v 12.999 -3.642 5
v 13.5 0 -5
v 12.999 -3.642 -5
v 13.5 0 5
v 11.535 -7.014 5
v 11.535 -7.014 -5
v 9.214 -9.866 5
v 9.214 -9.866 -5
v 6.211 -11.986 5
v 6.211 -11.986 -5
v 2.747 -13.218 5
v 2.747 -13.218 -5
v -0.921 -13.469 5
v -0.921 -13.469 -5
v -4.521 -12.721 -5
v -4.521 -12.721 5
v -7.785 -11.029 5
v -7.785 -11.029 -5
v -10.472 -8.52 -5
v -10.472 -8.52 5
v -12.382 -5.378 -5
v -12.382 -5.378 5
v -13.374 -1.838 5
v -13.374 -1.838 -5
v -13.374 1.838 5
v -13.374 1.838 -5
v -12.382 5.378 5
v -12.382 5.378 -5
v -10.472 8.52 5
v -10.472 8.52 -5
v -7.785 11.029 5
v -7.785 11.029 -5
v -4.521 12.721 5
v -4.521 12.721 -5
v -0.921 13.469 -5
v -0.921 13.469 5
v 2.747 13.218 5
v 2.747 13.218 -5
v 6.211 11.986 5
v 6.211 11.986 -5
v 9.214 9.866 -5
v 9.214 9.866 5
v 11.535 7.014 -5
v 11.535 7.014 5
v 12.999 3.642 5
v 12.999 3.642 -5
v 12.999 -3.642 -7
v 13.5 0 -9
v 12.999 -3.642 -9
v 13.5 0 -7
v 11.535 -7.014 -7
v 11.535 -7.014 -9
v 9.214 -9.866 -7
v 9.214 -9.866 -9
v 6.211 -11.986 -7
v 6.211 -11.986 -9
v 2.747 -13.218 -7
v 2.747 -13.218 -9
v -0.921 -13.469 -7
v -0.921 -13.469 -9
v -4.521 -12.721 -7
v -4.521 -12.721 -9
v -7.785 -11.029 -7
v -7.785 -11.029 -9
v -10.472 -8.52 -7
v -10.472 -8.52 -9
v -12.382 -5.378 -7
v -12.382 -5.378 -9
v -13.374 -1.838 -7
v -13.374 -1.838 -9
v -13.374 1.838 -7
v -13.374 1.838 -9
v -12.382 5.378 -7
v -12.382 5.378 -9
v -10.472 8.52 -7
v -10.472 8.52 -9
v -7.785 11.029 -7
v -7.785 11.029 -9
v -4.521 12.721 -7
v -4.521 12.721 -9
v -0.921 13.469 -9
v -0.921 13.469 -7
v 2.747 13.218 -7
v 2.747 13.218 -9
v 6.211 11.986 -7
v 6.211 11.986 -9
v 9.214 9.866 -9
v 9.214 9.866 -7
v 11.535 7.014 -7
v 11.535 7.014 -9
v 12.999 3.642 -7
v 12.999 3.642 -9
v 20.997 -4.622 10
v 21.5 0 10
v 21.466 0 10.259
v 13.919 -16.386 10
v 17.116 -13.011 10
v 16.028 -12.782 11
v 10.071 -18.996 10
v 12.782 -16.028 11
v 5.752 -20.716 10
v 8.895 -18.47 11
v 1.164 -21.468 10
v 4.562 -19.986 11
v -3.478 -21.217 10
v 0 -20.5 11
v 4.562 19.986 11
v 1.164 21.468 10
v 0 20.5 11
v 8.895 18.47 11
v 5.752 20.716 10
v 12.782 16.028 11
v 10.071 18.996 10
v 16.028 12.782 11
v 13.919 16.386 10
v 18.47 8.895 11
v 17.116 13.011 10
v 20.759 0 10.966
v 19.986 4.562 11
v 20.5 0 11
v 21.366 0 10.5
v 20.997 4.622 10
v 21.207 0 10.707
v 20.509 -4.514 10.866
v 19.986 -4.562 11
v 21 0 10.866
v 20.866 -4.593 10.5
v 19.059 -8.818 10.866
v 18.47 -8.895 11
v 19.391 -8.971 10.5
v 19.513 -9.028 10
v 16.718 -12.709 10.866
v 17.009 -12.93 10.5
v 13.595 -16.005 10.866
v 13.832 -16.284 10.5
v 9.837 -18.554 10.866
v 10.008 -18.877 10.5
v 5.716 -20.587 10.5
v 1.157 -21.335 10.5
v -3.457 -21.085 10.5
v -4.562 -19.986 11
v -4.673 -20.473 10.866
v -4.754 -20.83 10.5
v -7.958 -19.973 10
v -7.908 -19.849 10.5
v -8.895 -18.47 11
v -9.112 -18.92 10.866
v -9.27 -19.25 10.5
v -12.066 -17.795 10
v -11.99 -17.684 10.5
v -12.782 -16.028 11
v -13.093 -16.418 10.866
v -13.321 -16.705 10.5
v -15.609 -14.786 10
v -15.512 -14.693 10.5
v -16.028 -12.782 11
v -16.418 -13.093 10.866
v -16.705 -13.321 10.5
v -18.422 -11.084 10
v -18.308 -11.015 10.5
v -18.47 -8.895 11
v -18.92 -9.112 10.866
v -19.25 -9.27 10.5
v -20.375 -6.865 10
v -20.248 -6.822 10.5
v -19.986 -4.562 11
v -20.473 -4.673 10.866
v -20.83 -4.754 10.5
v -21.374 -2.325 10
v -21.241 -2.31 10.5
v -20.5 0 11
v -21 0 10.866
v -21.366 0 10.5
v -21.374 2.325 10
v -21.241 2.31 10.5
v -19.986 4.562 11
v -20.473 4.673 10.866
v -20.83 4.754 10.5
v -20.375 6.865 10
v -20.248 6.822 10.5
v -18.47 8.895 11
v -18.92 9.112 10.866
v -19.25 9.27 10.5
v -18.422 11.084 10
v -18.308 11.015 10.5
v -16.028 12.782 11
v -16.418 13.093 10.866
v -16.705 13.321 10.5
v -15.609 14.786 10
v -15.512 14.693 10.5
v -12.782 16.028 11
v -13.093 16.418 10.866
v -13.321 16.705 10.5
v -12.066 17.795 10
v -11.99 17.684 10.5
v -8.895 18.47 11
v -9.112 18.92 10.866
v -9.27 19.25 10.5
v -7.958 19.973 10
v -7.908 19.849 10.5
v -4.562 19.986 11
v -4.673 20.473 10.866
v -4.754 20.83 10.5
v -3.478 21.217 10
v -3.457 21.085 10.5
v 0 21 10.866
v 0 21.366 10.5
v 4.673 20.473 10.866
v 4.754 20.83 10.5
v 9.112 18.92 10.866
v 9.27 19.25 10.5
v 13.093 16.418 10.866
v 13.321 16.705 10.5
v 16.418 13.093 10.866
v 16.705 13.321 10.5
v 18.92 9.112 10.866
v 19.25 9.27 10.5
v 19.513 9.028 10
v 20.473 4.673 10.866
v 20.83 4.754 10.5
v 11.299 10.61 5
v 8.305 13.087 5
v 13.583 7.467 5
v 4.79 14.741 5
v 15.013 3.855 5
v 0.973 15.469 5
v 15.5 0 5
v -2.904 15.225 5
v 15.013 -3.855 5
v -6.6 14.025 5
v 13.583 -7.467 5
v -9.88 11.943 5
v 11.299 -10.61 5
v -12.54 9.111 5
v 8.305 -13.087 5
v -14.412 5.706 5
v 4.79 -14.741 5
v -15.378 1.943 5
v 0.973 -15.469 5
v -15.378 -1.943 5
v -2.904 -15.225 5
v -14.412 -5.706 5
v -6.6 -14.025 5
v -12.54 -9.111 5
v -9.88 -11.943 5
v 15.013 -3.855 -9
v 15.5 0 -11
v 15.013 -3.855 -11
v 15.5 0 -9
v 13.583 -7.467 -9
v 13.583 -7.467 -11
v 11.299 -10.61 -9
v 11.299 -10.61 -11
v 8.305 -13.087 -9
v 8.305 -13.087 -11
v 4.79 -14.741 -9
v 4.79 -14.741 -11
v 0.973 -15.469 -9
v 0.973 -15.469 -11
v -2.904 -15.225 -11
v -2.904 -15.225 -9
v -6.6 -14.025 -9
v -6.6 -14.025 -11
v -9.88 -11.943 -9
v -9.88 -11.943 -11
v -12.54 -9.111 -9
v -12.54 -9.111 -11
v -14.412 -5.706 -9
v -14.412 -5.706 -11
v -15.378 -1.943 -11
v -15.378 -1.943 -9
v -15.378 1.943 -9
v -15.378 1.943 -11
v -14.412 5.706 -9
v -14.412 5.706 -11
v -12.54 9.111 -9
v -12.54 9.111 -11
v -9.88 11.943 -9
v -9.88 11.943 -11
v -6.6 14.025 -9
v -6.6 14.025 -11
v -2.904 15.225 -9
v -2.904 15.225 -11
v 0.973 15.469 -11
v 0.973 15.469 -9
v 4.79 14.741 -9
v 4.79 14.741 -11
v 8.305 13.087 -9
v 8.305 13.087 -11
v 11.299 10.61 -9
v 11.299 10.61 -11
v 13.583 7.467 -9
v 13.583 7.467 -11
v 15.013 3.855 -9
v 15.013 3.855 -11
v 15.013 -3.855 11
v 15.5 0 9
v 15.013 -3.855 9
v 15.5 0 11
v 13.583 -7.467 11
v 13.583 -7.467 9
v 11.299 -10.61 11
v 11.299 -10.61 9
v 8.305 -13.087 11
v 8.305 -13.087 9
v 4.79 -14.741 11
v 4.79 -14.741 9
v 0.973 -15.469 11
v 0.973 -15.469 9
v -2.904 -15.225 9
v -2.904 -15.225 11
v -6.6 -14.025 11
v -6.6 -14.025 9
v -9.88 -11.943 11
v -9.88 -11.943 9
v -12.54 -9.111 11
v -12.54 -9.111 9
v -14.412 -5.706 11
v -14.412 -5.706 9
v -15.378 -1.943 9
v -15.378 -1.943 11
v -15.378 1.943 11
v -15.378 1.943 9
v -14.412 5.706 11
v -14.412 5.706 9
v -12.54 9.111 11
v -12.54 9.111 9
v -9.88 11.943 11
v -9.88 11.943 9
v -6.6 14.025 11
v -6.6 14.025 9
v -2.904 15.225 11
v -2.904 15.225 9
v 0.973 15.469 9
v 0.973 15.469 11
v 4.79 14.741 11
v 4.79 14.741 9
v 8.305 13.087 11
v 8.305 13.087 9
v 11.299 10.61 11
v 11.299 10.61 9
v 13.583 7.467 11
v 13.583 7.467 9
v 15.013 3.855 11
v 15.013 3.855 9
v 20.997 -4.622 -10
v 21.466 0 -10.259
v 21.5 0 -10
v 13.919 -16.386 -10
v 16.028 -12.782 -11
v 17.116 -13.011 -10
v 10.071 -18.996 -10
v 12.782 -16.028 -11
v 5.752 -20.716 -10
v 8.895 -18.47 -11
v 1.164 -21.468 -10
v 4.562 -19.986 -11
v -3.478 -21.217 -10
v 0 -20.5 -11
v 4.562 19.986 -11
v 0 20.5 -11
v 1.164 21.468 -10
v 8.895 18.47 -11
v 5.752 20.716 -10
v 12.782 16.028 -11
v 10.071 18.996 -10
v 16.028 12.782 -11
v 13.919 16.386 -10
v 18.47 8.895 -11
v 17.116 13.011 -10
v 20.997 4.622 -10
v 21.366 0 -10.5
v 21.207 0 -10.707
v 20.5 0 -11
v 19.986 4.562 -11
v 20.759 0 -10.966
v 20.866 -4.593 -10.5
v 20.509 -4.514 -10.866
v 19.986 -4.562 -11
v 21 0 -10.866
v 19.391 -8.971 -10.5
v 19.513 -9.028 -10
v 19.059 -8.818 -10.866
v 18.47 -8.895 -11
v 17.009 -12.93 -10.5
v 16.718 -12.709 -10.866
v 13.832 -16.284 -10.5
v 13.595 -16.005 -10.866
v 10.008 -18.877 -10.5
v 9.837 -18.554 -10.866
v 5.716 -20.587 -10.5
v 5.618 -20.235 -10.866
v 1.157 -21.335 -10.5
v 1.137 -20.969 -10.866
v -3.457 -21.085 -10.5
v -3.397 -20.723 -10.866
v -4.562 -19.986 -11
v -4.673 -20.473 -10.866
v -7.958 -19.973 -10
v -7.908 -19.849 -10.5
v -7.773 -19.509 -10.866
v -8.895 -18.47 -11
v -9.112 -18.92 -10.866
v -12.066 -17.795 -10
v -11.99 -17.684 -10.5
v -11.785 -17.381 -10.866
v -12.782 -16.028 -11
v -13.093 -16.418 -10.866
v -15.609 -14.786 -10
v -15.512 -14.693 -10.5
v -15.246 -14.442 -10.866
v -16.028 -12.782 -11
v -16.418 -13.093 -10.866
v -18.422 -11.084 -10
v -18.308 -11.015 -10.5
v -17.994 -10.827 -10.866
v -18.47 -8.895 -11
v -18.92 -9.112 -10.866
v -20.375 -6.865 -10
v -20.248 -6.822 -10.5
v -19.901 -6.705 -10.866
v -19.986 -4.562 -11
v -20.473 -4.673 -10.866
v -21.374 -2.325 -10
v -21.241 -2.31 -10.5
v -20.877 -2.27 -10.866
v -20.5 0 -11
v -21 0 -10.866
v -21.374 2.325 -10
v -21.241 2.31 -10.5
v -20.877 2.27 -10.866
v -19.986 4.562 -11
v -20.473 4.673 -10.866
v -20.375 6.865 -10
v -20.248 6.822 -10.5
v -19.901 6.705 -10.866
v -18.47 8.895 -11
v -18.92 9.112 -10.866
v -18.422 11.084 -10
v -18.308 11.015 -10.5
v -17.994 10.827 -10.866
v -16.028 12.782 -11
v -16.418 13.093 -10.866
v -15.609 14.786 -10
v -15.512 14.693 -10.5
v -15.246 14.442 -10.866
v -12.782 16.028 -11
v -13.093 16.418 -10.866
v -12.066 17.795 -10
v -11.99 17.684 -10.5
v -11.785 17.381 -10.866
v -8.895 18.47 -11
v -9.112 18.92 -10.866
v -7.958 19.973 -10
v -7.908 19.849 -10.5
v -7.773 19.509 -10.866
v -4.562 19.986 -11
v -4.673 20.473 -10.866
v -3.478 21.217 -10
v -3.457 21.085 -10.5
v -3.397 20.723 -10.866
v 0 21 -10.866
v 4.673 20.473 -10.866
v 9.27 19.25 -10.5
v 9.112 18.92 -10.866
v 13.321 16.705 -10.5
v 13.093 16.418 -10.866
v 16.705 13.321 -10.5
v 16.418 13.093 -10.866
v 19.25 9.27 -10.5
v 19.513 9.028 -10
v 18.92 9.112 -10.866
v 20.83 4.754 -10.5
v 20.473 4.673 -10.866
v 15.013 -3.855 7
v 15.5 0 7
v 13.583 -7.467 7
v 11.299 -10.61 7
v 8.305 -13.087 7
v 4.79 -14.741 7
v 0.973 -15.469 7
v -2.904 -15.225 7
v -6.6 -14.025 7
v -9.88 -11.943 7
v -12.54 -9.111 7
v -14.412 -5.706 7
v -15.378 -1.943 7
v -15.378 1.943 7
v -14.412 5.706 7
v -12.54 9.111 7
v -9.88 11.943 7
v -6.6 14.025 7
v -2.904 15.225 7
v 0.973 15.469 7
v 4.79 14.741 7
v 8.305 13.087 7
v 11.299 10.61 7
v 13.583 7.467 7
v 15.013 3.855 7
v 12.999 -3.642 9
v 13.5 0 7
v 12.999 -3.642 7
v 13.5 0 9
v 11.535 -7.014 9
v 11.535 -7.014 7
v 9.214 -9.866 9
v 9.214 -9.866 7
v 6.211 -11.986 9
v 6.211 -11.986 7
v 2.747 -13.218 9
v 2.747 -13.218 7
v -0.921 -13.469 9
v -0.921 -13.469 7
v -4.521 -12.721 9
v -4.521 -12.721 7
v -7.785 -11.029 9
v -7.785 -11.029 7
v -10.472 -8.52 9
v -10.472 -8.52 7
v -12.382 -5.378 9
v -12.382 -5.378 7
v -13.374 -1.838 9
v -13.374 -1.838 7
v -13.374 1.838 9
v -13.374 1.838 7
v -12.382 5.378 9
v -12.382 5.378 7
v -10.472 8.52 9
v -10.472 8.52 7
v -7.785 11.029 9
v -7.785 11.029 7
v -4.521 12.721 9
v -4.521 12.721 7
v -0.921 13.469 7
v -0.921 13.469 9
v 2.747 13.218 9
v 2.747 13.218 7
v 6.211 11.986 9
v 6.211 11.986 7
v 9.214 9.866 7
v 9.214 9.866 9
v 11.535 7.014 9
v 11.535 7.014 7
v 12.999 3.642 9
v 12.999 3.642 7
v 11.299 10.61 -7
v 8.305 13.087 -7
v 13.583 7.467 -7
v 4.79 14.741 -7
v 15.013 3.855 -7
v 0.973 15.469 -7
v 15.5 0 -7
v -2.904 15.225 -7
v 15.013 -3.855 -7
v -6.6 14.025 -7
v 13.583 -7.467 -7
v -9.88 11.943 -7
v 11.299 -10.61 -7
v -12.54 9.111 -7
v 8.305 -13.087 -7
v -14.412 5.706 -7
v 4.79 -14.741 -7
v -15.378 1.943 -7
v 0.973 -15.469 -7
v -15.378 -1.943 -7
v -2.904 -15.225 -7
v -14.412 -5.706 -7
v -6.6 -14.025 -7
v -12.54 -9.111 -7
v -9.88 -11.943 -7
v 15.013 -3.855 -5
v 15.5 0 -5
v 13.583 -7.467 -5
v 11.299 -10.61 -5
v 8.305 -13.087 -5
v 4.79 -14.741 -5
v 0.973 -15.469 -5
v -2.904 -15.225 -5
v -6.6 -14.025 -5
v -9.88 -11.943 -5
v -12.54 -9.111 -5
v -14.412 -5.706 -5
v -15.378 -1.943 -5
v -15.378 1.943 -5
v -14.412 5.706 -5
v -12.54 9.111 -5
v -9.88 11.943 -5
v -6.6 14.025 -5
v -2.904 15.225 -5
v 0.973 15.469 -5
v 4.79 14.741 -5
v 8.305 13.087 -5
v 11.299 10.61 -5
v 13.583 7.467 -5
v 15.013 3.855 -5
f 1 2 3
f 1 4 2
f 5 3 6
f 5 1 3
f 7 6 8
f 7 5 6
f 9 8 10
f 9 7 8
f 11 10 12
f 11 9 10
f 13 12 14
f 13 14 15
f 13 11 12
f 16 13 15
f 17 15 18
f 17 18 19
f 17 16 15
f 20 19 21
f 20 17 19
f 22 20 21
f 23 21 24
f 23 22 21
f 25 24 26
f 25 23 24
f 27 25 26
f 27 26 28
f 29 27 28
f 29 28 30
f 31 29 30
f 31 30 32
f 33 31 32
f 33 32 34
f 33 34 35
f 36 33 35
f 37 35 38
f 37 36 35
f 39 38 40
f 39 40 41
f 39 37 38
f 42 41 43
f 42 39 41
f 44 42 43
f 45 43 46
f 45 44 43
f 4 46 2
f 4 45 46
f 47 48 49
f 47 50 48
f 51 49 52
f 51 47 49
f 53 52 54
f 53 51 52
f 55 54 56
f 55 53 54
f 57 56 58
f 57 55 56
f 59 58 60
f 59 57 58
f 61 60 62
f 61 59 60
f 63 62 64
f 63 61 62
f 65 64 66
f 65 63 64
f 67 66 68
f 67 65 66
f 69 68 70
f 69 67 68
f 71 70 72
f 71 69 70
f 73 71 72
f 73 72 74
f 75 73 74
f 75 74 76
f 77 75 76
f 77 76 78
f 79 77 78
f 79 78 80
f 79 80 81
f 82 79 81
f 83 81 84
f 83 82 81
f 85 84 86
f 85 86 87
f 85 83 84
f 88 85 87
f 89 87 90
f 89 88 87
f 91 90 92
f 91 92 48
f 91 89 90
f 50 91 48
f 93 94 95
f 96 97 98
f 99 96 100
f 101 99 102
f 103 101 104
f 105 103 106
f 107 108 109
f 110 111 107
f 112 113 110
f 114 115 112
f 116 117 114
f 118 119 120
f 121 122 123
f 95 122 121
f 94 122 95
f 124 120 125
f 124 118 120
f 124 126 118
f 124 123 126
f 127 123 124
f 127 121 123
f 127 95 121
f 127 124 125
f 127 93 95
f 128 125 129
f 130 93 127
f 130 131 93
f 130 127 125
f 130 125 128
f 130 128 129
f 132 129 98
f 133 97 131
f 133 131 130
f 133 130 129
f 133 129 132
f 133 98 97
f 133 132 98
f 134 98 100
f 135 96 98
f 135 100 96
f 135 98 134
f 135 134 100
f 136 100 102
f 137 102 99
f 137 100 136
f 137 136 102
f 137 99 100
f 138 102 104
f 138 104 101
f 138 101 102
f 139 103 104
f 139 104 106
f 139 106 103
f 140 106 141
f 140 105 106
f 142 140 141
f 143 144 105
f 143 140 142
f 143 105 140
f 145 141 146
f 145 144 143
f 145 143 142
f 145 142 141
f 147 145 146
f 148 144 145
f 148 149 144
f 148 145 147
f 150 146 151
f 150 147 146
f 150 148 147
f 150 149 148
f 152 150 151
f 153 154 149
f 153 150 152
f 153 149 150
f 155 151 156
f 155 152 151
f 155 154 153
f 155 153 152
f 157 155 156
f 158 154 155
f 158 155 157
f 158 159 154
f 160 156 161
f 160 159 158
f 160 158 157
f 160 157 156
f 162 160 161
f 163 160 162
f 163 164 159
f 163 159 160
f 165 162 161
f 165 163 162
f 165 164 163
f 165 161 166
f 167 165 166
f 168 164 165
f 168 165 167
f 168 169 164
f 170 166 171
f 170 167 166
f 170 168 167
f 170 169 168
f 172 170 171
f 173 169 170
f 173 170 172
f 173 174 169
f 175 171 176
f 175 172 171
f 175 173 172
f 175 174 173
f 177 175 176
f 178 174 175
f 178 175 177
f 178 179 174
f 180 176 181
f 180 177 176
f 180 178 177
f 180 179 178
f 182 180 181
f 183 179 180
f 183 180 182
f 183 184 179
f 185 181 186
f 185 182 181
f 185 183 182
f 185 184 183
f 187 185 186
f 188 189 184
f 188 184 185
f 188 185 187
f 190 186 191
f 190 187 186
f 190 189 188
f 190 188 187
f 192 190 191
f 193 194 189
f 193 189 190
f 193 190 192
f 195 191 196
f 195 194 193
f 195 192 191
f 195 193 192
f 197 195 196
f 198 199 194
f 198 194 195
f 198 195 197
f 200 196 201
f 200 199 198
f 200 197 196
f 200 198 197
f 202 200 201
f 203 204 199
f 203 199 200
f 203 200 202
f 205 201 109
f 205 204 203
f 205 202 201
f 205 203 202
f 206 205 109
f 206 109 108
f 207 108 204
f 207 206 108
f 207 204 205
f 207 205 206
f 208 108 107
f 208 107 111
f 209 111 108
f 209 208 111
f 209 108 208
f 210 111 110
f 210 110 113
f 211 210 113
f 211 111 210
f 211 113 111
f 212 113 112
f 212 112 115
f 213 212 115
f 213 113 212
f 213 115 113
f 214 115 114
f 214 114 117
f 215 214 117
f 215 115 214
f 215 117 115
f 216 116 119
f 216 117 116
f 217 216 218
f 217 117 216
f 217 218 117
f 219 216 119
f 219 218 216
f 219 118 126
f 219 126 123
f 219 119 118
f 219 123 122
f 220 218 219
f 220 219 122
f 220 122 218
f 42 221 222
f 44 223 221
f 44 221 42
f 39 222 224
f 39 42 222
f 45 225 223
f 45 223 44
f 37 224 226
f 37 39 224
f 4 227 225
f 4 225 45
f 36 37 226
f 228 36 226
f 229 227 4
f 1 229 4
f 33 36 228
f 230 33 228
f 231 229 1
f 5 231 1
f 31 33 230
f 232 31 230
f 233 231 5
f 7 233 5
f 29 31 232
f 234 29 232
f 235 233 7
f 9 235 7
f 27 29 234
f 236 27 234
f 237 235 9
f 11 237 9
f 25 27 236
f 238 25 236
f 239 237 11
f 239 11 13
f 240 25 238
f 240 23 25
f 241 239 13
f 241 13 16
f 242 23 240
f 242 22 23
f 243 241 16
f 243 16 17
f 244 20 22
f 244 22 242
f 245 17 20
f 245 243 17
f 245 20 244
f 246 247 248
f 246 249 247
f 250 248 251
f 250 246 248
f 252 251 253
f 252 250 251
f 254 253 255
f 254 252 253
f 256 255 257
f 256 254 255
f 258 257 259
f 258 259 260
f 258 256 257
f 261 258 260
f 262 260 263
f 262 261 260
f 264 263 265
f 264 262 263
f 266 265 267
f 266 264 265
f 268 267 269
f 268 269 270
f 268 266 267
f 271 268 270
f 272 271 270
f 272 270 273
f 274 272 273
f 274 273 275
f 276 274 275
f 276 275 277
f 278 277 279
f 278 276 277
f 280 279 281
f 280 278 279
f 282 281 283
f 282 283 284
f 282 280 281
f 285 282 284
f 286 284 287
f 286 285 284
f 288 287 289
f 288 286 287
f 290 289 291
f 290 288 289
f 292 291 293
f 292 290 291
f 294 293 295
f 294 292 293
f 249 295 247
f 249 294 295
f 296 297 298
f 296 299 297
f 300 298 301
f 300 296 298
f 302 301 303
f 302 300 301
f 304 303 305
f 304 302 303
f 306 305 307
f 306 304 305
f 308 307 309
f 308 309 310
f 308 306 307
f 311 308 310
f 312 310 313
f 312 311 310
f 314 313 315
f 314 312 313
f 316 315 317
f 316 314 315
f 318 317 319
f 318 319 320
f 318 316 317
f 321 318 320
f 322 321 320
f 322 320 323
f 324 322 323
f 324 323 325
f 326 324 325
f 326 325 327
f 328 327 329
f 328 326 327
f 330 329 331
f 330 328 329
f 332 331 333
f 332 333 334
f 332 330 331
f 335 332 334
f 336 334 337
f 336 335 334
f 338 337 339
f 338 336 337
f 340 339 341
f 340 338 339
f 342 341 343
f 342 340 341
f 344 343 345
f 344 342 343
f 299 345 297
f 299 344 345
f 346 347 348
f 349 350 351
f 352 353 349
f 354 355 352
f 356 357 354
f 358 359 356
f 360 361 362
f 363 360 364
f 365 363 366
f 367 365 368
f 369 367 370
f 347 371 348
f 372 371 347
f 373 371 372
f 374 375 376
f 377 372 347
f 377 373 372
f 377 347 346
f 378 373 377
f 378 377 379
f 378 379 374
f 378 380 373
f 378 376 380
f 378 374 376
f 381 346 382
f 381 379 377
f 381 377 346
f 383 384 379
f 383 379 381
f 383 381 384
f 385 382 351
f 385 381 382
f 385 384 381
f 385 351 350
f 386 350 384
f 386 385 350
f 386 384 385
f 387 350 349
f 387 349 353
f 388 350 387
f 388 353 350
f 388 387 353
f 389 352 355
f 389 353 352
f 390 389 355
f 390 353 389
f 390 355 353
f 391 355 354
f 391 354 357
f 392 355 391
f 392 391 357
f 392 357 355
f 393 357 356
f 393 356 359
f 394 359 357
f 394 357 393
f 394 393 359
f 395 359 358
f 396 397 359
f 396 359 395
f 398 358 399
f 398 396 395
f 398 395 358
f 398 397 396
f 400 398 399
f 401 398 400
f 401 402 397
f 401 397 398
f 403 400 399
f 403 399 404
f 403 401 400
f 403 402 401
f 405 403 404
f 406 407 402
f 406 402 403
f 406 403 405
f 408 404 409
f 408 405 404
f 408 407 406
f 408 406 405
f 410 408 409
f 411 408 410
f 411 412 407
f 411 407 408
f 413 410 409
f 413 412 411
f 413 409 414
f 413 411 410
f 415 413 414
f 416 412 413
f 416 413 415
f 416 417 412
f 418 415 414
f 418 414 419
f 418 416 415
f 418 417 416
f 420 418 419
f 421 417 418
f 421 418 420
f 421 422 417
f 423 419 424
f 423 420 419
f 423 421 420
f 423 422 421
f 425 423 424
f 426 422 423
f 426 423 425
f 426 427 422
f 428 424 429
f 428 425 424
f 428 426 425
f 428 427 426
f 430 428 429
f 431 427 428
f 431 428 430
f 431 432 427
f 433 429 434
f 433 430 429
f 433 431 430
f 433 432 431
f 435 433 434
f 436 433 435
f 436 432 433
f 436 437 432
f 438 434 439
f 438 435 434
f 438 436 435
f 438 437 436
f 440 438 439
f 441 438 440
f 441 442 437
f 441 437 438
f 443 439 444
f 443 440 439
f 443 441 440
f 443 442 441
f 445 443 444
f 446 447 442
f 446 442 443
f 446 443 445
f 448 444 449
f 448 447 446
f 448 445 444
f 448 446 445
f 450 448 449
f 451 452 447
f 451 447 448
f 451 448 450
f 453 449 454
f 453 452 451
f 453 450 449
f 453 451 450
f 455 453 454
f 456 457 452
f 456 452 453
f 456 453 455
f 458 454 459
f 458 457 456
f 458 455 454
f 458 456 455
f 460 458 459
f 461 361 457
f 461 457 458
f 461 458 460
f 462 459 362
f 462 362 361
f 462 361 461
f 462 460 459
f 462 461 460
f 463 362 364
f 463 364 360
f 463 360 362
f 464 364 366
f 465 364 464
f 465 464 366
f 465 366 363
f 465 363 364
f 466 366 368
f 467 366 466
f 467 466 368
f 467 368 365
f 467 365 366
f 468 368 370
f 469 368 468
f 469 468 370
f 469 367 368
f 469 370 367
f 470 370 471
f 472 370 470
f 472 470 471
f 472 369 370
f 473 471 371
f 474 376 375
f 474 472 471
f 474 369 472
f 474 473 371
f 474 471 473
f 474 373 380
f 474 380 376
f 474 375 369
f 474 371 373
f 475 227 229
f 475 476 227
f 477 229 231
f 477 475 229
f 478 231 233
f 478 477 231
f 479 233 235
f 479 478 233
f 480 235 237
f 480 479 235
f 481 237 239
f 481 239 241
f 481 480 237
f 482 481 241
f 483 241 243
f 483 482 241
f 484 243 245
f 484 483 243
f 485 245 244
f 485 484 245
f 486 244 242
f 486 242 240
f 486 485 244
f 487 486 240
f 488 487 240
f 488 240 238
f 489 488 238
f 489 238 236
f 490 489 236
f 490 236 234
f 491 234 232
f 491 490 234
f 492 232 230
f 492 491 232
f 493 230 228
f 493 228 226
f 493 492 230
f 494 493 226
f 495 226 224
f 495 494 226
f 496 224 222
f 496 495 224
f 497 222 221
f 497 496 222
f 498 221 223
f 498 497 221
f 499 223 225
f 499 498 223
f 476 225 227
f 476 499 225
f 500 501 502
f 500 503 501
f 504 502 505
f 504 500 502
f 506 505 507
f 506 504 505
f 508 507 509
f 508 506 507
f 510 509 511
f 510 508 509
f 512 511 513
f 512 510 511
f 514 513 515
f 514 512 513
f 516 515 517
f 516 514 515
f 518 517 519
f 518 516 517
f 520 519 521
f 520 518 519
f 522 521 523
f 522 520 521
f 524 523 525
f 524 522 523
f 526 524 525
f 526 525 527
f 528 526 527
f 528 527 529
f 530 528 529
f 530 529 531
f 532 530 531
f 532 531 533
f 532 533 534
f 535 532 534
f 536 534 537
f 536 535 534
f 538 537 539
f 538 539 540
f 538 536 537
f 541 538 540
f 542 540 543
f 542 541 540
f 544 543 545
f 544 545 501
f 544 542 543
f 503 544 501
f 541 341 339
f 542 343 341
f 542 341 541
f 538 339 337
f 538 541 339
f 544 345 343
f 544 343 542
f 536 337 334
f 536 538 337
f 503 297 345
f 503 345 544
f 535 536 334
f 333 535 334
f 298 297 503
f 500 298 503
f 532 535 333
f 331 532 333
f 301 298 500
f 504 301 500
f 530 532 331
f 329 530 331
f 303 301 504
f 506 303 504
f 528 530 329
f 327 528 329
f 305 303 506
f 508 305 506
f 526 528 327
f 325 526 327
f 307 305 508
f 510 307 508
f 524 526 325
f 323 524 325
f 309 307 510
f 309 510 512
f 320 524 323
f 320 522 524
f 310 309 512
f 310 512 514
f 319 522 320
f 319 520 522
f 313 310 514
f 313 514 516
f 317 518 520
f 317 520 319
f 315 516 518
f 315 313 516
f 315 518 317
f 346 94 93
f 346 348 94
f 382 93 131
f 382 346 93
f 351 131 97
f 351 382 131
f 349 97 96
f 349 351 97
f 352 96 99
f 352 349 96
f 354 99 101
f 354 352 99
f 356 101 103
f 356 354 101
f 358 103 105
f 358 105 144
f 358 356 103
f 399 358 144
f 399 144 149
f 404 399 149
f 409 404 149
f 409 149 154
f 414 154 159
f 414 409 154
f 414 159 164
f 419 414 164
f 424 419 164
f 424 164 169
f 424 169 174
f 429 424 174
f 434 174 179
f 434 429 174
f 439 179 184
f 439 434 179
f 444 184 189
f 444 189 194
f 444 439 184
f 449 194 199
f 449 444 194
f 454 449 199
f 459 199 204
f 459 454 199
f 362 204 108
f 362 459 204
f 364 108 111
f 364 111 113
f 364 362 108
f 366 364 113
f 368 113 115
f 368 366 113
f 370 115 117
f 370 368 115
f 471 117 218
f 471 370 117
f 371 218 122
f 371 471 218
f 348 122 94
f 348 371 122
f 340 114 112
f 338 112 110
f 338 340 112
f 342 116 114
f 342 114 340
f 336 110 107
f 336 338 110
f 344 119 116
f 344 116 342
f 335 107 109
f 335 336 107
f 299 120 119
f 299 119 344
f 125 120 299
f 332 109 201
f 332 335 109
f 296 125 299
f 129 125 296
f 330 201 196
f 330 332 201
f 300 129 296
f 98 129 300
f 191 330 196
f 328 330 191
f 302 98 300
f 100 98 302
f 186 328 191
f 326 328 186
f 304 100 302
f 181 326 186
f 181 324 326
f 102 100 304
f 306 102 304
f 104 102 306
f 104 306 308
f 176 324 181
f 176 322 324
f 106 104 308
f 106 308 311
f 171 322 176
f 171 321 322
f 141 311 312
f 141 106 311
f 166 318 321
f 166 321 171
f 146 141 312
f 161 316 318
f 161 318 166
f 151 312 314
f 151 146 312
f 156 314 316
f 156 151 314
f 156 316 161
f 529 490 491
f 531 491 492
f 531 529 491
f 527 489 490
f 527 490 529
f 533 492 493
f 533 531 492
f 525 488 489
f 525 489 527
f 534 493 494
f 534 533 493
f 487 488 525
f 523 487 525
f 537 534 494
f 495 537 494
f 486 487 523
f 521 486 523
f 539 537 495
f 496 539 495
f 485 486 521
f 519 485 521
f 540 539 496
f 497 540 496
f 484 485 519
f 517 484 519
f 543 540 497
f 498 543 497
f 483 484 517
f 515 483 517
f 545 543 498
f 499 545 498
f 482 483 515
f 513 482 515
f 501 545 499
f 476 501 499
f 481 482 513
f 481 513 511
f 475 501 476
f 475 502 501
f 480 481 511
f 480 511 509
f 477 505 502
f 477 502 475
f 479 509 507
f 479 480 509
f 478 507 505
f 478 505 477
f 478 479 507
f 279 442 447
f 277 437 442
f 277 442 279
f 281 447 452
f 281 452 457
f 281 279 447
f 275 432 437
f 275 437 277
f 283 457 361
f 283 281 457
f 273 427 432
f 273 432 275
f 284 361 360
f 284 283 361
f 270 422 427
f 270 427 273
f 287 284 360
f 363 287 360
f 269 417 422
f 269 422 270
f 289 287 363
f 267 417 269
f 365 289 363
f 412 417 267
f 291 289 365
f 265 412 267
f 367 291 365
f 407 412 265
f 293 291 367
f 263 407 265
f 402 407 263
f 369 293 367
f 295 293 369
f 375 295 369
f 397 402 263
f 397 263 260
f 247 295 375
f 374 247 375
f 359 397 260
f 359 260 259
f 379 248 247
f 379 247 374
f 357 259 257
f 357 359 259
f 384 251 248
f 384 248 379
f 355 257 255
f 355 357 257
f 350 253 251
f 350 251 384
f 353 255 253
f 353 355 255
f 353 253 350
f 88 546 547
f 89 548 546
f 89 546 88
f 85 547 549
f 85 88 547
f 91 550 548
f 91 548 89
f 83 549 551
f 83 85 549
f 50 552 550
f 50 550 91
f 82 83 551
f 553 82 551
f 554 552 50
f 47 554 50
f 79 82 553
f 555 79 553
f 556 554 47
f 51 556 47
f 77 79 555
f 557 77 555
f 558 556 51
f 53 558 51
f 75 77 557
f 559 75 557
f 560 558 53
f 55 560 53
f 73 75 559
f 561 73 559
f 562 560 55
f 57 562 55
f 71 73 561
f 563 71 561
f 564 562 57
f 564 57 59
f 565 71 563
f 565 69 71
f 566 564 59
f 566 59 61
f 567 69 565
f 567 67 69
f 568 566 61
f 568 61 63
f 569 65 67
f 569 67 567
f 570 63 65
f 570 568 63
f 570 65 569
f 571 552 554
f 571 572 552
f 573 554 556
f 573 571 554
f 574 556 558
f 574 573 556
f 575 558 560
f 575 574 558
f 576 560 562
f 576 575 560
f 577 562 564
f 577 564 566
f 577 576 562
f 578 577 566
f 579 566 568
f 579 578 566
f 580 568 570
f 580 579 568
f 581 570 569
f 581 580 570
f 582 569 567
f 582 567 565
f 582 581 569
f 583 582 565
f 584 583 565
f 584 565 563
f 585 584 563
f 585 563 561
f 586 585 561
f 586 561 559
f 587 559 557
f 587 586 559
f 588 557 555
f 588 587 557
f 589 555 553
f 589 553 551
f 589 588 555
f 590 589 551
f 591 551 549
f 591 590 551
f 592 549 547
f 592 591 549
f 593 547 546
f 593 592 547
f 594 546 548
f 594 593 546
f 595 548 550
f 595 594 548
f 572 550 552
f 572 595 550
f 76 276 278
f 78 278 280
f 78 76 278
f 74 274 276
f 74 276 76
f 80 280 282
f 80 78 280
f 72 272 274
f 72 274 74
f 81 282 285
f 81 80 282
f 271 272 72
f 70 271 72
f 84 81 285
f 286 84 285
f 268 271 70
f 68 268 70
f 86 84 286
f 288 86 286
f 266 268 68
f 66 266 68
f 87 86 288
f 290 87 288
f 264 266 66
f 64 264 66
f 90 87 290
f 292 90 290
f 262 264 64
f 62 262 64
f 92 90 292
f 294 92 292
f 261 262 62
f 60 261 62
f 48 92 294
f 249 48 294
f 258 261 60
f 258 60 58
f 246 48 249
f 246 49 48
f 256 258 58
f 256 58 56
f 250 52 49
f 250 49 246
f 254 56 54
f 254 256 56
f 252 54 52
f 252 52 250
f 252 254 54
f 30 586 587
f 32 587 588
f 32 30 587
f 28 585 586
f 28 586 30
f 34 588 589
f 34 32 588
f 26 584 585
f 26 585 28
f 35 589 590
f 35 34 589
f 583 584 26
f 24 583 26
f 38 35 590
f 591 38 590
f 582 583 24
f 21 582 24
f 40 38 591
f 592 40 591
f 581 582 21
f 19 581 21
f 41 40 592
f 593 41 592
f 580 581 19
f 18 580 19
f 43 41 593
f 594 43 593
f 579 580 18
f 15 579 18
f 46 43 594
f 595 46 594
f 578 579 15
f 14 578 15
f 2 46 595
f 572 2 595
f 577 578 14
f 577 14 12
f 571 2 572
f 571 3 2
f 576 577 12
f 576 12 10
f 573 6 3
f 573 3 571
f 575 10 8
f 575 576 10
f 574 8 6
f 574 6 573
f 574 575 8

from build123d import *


with BuildPart() as part:
    # Эскиз1 → Повернуть1 (revolve)
    with BuildSketch(Plane(origin=(0, 0, 0), x_dir=(0, 0, -1), z_dir=(1, 0, 0)), mode=Mode.PRIVATE) as revolve_1_sk:
        with BuildLine():
            Line((-10, 21.5), (10, 21.5))
            ThreePointArc((10, 21.5), (10.707106781, 21.207106781), (11, 20.5))
            Line((11, 20.5), (11, 15.5))
            Line((11, 15.5), (9, 15.5))
            Line((9, 15.5), (9, 13.5))
            Line((9, 13.5), (7, 13.5))
            Line((7, 13.5), (7, 15.5))
            Line((7, 15.5), (5, 15.5))
            Line((5, 15.5), (5, 13.5))
            Line((5, 13.5), (-5, 13.5))
            Line((-5, 13.5), (-5, 15.5))
            Line((-5, 15.5), (-7, 15.5))
            Line((-7, 15.5), (-7, 13.5))
            Line((-7, 13.5), (-9, 13.5))
            Line((-9, 13.5), (-9, 15.5))
            Line((-9, 15.5), (-11, 15.5))
            Line((-11, 15.5), (-11, 20.5))
            ThreePointArc((-11, 20.5), (-10.707106781, 21.207106781), (-10, 21.5))
        make_face()
    revolve(revolve_1_sk.sketch.rotate(Axis((0, 0, 20.390367039), (0, 0, -1)), 90), axis=Axis((0, 0, 20.390367039), (0, 0, -1)))


solid = part.part
